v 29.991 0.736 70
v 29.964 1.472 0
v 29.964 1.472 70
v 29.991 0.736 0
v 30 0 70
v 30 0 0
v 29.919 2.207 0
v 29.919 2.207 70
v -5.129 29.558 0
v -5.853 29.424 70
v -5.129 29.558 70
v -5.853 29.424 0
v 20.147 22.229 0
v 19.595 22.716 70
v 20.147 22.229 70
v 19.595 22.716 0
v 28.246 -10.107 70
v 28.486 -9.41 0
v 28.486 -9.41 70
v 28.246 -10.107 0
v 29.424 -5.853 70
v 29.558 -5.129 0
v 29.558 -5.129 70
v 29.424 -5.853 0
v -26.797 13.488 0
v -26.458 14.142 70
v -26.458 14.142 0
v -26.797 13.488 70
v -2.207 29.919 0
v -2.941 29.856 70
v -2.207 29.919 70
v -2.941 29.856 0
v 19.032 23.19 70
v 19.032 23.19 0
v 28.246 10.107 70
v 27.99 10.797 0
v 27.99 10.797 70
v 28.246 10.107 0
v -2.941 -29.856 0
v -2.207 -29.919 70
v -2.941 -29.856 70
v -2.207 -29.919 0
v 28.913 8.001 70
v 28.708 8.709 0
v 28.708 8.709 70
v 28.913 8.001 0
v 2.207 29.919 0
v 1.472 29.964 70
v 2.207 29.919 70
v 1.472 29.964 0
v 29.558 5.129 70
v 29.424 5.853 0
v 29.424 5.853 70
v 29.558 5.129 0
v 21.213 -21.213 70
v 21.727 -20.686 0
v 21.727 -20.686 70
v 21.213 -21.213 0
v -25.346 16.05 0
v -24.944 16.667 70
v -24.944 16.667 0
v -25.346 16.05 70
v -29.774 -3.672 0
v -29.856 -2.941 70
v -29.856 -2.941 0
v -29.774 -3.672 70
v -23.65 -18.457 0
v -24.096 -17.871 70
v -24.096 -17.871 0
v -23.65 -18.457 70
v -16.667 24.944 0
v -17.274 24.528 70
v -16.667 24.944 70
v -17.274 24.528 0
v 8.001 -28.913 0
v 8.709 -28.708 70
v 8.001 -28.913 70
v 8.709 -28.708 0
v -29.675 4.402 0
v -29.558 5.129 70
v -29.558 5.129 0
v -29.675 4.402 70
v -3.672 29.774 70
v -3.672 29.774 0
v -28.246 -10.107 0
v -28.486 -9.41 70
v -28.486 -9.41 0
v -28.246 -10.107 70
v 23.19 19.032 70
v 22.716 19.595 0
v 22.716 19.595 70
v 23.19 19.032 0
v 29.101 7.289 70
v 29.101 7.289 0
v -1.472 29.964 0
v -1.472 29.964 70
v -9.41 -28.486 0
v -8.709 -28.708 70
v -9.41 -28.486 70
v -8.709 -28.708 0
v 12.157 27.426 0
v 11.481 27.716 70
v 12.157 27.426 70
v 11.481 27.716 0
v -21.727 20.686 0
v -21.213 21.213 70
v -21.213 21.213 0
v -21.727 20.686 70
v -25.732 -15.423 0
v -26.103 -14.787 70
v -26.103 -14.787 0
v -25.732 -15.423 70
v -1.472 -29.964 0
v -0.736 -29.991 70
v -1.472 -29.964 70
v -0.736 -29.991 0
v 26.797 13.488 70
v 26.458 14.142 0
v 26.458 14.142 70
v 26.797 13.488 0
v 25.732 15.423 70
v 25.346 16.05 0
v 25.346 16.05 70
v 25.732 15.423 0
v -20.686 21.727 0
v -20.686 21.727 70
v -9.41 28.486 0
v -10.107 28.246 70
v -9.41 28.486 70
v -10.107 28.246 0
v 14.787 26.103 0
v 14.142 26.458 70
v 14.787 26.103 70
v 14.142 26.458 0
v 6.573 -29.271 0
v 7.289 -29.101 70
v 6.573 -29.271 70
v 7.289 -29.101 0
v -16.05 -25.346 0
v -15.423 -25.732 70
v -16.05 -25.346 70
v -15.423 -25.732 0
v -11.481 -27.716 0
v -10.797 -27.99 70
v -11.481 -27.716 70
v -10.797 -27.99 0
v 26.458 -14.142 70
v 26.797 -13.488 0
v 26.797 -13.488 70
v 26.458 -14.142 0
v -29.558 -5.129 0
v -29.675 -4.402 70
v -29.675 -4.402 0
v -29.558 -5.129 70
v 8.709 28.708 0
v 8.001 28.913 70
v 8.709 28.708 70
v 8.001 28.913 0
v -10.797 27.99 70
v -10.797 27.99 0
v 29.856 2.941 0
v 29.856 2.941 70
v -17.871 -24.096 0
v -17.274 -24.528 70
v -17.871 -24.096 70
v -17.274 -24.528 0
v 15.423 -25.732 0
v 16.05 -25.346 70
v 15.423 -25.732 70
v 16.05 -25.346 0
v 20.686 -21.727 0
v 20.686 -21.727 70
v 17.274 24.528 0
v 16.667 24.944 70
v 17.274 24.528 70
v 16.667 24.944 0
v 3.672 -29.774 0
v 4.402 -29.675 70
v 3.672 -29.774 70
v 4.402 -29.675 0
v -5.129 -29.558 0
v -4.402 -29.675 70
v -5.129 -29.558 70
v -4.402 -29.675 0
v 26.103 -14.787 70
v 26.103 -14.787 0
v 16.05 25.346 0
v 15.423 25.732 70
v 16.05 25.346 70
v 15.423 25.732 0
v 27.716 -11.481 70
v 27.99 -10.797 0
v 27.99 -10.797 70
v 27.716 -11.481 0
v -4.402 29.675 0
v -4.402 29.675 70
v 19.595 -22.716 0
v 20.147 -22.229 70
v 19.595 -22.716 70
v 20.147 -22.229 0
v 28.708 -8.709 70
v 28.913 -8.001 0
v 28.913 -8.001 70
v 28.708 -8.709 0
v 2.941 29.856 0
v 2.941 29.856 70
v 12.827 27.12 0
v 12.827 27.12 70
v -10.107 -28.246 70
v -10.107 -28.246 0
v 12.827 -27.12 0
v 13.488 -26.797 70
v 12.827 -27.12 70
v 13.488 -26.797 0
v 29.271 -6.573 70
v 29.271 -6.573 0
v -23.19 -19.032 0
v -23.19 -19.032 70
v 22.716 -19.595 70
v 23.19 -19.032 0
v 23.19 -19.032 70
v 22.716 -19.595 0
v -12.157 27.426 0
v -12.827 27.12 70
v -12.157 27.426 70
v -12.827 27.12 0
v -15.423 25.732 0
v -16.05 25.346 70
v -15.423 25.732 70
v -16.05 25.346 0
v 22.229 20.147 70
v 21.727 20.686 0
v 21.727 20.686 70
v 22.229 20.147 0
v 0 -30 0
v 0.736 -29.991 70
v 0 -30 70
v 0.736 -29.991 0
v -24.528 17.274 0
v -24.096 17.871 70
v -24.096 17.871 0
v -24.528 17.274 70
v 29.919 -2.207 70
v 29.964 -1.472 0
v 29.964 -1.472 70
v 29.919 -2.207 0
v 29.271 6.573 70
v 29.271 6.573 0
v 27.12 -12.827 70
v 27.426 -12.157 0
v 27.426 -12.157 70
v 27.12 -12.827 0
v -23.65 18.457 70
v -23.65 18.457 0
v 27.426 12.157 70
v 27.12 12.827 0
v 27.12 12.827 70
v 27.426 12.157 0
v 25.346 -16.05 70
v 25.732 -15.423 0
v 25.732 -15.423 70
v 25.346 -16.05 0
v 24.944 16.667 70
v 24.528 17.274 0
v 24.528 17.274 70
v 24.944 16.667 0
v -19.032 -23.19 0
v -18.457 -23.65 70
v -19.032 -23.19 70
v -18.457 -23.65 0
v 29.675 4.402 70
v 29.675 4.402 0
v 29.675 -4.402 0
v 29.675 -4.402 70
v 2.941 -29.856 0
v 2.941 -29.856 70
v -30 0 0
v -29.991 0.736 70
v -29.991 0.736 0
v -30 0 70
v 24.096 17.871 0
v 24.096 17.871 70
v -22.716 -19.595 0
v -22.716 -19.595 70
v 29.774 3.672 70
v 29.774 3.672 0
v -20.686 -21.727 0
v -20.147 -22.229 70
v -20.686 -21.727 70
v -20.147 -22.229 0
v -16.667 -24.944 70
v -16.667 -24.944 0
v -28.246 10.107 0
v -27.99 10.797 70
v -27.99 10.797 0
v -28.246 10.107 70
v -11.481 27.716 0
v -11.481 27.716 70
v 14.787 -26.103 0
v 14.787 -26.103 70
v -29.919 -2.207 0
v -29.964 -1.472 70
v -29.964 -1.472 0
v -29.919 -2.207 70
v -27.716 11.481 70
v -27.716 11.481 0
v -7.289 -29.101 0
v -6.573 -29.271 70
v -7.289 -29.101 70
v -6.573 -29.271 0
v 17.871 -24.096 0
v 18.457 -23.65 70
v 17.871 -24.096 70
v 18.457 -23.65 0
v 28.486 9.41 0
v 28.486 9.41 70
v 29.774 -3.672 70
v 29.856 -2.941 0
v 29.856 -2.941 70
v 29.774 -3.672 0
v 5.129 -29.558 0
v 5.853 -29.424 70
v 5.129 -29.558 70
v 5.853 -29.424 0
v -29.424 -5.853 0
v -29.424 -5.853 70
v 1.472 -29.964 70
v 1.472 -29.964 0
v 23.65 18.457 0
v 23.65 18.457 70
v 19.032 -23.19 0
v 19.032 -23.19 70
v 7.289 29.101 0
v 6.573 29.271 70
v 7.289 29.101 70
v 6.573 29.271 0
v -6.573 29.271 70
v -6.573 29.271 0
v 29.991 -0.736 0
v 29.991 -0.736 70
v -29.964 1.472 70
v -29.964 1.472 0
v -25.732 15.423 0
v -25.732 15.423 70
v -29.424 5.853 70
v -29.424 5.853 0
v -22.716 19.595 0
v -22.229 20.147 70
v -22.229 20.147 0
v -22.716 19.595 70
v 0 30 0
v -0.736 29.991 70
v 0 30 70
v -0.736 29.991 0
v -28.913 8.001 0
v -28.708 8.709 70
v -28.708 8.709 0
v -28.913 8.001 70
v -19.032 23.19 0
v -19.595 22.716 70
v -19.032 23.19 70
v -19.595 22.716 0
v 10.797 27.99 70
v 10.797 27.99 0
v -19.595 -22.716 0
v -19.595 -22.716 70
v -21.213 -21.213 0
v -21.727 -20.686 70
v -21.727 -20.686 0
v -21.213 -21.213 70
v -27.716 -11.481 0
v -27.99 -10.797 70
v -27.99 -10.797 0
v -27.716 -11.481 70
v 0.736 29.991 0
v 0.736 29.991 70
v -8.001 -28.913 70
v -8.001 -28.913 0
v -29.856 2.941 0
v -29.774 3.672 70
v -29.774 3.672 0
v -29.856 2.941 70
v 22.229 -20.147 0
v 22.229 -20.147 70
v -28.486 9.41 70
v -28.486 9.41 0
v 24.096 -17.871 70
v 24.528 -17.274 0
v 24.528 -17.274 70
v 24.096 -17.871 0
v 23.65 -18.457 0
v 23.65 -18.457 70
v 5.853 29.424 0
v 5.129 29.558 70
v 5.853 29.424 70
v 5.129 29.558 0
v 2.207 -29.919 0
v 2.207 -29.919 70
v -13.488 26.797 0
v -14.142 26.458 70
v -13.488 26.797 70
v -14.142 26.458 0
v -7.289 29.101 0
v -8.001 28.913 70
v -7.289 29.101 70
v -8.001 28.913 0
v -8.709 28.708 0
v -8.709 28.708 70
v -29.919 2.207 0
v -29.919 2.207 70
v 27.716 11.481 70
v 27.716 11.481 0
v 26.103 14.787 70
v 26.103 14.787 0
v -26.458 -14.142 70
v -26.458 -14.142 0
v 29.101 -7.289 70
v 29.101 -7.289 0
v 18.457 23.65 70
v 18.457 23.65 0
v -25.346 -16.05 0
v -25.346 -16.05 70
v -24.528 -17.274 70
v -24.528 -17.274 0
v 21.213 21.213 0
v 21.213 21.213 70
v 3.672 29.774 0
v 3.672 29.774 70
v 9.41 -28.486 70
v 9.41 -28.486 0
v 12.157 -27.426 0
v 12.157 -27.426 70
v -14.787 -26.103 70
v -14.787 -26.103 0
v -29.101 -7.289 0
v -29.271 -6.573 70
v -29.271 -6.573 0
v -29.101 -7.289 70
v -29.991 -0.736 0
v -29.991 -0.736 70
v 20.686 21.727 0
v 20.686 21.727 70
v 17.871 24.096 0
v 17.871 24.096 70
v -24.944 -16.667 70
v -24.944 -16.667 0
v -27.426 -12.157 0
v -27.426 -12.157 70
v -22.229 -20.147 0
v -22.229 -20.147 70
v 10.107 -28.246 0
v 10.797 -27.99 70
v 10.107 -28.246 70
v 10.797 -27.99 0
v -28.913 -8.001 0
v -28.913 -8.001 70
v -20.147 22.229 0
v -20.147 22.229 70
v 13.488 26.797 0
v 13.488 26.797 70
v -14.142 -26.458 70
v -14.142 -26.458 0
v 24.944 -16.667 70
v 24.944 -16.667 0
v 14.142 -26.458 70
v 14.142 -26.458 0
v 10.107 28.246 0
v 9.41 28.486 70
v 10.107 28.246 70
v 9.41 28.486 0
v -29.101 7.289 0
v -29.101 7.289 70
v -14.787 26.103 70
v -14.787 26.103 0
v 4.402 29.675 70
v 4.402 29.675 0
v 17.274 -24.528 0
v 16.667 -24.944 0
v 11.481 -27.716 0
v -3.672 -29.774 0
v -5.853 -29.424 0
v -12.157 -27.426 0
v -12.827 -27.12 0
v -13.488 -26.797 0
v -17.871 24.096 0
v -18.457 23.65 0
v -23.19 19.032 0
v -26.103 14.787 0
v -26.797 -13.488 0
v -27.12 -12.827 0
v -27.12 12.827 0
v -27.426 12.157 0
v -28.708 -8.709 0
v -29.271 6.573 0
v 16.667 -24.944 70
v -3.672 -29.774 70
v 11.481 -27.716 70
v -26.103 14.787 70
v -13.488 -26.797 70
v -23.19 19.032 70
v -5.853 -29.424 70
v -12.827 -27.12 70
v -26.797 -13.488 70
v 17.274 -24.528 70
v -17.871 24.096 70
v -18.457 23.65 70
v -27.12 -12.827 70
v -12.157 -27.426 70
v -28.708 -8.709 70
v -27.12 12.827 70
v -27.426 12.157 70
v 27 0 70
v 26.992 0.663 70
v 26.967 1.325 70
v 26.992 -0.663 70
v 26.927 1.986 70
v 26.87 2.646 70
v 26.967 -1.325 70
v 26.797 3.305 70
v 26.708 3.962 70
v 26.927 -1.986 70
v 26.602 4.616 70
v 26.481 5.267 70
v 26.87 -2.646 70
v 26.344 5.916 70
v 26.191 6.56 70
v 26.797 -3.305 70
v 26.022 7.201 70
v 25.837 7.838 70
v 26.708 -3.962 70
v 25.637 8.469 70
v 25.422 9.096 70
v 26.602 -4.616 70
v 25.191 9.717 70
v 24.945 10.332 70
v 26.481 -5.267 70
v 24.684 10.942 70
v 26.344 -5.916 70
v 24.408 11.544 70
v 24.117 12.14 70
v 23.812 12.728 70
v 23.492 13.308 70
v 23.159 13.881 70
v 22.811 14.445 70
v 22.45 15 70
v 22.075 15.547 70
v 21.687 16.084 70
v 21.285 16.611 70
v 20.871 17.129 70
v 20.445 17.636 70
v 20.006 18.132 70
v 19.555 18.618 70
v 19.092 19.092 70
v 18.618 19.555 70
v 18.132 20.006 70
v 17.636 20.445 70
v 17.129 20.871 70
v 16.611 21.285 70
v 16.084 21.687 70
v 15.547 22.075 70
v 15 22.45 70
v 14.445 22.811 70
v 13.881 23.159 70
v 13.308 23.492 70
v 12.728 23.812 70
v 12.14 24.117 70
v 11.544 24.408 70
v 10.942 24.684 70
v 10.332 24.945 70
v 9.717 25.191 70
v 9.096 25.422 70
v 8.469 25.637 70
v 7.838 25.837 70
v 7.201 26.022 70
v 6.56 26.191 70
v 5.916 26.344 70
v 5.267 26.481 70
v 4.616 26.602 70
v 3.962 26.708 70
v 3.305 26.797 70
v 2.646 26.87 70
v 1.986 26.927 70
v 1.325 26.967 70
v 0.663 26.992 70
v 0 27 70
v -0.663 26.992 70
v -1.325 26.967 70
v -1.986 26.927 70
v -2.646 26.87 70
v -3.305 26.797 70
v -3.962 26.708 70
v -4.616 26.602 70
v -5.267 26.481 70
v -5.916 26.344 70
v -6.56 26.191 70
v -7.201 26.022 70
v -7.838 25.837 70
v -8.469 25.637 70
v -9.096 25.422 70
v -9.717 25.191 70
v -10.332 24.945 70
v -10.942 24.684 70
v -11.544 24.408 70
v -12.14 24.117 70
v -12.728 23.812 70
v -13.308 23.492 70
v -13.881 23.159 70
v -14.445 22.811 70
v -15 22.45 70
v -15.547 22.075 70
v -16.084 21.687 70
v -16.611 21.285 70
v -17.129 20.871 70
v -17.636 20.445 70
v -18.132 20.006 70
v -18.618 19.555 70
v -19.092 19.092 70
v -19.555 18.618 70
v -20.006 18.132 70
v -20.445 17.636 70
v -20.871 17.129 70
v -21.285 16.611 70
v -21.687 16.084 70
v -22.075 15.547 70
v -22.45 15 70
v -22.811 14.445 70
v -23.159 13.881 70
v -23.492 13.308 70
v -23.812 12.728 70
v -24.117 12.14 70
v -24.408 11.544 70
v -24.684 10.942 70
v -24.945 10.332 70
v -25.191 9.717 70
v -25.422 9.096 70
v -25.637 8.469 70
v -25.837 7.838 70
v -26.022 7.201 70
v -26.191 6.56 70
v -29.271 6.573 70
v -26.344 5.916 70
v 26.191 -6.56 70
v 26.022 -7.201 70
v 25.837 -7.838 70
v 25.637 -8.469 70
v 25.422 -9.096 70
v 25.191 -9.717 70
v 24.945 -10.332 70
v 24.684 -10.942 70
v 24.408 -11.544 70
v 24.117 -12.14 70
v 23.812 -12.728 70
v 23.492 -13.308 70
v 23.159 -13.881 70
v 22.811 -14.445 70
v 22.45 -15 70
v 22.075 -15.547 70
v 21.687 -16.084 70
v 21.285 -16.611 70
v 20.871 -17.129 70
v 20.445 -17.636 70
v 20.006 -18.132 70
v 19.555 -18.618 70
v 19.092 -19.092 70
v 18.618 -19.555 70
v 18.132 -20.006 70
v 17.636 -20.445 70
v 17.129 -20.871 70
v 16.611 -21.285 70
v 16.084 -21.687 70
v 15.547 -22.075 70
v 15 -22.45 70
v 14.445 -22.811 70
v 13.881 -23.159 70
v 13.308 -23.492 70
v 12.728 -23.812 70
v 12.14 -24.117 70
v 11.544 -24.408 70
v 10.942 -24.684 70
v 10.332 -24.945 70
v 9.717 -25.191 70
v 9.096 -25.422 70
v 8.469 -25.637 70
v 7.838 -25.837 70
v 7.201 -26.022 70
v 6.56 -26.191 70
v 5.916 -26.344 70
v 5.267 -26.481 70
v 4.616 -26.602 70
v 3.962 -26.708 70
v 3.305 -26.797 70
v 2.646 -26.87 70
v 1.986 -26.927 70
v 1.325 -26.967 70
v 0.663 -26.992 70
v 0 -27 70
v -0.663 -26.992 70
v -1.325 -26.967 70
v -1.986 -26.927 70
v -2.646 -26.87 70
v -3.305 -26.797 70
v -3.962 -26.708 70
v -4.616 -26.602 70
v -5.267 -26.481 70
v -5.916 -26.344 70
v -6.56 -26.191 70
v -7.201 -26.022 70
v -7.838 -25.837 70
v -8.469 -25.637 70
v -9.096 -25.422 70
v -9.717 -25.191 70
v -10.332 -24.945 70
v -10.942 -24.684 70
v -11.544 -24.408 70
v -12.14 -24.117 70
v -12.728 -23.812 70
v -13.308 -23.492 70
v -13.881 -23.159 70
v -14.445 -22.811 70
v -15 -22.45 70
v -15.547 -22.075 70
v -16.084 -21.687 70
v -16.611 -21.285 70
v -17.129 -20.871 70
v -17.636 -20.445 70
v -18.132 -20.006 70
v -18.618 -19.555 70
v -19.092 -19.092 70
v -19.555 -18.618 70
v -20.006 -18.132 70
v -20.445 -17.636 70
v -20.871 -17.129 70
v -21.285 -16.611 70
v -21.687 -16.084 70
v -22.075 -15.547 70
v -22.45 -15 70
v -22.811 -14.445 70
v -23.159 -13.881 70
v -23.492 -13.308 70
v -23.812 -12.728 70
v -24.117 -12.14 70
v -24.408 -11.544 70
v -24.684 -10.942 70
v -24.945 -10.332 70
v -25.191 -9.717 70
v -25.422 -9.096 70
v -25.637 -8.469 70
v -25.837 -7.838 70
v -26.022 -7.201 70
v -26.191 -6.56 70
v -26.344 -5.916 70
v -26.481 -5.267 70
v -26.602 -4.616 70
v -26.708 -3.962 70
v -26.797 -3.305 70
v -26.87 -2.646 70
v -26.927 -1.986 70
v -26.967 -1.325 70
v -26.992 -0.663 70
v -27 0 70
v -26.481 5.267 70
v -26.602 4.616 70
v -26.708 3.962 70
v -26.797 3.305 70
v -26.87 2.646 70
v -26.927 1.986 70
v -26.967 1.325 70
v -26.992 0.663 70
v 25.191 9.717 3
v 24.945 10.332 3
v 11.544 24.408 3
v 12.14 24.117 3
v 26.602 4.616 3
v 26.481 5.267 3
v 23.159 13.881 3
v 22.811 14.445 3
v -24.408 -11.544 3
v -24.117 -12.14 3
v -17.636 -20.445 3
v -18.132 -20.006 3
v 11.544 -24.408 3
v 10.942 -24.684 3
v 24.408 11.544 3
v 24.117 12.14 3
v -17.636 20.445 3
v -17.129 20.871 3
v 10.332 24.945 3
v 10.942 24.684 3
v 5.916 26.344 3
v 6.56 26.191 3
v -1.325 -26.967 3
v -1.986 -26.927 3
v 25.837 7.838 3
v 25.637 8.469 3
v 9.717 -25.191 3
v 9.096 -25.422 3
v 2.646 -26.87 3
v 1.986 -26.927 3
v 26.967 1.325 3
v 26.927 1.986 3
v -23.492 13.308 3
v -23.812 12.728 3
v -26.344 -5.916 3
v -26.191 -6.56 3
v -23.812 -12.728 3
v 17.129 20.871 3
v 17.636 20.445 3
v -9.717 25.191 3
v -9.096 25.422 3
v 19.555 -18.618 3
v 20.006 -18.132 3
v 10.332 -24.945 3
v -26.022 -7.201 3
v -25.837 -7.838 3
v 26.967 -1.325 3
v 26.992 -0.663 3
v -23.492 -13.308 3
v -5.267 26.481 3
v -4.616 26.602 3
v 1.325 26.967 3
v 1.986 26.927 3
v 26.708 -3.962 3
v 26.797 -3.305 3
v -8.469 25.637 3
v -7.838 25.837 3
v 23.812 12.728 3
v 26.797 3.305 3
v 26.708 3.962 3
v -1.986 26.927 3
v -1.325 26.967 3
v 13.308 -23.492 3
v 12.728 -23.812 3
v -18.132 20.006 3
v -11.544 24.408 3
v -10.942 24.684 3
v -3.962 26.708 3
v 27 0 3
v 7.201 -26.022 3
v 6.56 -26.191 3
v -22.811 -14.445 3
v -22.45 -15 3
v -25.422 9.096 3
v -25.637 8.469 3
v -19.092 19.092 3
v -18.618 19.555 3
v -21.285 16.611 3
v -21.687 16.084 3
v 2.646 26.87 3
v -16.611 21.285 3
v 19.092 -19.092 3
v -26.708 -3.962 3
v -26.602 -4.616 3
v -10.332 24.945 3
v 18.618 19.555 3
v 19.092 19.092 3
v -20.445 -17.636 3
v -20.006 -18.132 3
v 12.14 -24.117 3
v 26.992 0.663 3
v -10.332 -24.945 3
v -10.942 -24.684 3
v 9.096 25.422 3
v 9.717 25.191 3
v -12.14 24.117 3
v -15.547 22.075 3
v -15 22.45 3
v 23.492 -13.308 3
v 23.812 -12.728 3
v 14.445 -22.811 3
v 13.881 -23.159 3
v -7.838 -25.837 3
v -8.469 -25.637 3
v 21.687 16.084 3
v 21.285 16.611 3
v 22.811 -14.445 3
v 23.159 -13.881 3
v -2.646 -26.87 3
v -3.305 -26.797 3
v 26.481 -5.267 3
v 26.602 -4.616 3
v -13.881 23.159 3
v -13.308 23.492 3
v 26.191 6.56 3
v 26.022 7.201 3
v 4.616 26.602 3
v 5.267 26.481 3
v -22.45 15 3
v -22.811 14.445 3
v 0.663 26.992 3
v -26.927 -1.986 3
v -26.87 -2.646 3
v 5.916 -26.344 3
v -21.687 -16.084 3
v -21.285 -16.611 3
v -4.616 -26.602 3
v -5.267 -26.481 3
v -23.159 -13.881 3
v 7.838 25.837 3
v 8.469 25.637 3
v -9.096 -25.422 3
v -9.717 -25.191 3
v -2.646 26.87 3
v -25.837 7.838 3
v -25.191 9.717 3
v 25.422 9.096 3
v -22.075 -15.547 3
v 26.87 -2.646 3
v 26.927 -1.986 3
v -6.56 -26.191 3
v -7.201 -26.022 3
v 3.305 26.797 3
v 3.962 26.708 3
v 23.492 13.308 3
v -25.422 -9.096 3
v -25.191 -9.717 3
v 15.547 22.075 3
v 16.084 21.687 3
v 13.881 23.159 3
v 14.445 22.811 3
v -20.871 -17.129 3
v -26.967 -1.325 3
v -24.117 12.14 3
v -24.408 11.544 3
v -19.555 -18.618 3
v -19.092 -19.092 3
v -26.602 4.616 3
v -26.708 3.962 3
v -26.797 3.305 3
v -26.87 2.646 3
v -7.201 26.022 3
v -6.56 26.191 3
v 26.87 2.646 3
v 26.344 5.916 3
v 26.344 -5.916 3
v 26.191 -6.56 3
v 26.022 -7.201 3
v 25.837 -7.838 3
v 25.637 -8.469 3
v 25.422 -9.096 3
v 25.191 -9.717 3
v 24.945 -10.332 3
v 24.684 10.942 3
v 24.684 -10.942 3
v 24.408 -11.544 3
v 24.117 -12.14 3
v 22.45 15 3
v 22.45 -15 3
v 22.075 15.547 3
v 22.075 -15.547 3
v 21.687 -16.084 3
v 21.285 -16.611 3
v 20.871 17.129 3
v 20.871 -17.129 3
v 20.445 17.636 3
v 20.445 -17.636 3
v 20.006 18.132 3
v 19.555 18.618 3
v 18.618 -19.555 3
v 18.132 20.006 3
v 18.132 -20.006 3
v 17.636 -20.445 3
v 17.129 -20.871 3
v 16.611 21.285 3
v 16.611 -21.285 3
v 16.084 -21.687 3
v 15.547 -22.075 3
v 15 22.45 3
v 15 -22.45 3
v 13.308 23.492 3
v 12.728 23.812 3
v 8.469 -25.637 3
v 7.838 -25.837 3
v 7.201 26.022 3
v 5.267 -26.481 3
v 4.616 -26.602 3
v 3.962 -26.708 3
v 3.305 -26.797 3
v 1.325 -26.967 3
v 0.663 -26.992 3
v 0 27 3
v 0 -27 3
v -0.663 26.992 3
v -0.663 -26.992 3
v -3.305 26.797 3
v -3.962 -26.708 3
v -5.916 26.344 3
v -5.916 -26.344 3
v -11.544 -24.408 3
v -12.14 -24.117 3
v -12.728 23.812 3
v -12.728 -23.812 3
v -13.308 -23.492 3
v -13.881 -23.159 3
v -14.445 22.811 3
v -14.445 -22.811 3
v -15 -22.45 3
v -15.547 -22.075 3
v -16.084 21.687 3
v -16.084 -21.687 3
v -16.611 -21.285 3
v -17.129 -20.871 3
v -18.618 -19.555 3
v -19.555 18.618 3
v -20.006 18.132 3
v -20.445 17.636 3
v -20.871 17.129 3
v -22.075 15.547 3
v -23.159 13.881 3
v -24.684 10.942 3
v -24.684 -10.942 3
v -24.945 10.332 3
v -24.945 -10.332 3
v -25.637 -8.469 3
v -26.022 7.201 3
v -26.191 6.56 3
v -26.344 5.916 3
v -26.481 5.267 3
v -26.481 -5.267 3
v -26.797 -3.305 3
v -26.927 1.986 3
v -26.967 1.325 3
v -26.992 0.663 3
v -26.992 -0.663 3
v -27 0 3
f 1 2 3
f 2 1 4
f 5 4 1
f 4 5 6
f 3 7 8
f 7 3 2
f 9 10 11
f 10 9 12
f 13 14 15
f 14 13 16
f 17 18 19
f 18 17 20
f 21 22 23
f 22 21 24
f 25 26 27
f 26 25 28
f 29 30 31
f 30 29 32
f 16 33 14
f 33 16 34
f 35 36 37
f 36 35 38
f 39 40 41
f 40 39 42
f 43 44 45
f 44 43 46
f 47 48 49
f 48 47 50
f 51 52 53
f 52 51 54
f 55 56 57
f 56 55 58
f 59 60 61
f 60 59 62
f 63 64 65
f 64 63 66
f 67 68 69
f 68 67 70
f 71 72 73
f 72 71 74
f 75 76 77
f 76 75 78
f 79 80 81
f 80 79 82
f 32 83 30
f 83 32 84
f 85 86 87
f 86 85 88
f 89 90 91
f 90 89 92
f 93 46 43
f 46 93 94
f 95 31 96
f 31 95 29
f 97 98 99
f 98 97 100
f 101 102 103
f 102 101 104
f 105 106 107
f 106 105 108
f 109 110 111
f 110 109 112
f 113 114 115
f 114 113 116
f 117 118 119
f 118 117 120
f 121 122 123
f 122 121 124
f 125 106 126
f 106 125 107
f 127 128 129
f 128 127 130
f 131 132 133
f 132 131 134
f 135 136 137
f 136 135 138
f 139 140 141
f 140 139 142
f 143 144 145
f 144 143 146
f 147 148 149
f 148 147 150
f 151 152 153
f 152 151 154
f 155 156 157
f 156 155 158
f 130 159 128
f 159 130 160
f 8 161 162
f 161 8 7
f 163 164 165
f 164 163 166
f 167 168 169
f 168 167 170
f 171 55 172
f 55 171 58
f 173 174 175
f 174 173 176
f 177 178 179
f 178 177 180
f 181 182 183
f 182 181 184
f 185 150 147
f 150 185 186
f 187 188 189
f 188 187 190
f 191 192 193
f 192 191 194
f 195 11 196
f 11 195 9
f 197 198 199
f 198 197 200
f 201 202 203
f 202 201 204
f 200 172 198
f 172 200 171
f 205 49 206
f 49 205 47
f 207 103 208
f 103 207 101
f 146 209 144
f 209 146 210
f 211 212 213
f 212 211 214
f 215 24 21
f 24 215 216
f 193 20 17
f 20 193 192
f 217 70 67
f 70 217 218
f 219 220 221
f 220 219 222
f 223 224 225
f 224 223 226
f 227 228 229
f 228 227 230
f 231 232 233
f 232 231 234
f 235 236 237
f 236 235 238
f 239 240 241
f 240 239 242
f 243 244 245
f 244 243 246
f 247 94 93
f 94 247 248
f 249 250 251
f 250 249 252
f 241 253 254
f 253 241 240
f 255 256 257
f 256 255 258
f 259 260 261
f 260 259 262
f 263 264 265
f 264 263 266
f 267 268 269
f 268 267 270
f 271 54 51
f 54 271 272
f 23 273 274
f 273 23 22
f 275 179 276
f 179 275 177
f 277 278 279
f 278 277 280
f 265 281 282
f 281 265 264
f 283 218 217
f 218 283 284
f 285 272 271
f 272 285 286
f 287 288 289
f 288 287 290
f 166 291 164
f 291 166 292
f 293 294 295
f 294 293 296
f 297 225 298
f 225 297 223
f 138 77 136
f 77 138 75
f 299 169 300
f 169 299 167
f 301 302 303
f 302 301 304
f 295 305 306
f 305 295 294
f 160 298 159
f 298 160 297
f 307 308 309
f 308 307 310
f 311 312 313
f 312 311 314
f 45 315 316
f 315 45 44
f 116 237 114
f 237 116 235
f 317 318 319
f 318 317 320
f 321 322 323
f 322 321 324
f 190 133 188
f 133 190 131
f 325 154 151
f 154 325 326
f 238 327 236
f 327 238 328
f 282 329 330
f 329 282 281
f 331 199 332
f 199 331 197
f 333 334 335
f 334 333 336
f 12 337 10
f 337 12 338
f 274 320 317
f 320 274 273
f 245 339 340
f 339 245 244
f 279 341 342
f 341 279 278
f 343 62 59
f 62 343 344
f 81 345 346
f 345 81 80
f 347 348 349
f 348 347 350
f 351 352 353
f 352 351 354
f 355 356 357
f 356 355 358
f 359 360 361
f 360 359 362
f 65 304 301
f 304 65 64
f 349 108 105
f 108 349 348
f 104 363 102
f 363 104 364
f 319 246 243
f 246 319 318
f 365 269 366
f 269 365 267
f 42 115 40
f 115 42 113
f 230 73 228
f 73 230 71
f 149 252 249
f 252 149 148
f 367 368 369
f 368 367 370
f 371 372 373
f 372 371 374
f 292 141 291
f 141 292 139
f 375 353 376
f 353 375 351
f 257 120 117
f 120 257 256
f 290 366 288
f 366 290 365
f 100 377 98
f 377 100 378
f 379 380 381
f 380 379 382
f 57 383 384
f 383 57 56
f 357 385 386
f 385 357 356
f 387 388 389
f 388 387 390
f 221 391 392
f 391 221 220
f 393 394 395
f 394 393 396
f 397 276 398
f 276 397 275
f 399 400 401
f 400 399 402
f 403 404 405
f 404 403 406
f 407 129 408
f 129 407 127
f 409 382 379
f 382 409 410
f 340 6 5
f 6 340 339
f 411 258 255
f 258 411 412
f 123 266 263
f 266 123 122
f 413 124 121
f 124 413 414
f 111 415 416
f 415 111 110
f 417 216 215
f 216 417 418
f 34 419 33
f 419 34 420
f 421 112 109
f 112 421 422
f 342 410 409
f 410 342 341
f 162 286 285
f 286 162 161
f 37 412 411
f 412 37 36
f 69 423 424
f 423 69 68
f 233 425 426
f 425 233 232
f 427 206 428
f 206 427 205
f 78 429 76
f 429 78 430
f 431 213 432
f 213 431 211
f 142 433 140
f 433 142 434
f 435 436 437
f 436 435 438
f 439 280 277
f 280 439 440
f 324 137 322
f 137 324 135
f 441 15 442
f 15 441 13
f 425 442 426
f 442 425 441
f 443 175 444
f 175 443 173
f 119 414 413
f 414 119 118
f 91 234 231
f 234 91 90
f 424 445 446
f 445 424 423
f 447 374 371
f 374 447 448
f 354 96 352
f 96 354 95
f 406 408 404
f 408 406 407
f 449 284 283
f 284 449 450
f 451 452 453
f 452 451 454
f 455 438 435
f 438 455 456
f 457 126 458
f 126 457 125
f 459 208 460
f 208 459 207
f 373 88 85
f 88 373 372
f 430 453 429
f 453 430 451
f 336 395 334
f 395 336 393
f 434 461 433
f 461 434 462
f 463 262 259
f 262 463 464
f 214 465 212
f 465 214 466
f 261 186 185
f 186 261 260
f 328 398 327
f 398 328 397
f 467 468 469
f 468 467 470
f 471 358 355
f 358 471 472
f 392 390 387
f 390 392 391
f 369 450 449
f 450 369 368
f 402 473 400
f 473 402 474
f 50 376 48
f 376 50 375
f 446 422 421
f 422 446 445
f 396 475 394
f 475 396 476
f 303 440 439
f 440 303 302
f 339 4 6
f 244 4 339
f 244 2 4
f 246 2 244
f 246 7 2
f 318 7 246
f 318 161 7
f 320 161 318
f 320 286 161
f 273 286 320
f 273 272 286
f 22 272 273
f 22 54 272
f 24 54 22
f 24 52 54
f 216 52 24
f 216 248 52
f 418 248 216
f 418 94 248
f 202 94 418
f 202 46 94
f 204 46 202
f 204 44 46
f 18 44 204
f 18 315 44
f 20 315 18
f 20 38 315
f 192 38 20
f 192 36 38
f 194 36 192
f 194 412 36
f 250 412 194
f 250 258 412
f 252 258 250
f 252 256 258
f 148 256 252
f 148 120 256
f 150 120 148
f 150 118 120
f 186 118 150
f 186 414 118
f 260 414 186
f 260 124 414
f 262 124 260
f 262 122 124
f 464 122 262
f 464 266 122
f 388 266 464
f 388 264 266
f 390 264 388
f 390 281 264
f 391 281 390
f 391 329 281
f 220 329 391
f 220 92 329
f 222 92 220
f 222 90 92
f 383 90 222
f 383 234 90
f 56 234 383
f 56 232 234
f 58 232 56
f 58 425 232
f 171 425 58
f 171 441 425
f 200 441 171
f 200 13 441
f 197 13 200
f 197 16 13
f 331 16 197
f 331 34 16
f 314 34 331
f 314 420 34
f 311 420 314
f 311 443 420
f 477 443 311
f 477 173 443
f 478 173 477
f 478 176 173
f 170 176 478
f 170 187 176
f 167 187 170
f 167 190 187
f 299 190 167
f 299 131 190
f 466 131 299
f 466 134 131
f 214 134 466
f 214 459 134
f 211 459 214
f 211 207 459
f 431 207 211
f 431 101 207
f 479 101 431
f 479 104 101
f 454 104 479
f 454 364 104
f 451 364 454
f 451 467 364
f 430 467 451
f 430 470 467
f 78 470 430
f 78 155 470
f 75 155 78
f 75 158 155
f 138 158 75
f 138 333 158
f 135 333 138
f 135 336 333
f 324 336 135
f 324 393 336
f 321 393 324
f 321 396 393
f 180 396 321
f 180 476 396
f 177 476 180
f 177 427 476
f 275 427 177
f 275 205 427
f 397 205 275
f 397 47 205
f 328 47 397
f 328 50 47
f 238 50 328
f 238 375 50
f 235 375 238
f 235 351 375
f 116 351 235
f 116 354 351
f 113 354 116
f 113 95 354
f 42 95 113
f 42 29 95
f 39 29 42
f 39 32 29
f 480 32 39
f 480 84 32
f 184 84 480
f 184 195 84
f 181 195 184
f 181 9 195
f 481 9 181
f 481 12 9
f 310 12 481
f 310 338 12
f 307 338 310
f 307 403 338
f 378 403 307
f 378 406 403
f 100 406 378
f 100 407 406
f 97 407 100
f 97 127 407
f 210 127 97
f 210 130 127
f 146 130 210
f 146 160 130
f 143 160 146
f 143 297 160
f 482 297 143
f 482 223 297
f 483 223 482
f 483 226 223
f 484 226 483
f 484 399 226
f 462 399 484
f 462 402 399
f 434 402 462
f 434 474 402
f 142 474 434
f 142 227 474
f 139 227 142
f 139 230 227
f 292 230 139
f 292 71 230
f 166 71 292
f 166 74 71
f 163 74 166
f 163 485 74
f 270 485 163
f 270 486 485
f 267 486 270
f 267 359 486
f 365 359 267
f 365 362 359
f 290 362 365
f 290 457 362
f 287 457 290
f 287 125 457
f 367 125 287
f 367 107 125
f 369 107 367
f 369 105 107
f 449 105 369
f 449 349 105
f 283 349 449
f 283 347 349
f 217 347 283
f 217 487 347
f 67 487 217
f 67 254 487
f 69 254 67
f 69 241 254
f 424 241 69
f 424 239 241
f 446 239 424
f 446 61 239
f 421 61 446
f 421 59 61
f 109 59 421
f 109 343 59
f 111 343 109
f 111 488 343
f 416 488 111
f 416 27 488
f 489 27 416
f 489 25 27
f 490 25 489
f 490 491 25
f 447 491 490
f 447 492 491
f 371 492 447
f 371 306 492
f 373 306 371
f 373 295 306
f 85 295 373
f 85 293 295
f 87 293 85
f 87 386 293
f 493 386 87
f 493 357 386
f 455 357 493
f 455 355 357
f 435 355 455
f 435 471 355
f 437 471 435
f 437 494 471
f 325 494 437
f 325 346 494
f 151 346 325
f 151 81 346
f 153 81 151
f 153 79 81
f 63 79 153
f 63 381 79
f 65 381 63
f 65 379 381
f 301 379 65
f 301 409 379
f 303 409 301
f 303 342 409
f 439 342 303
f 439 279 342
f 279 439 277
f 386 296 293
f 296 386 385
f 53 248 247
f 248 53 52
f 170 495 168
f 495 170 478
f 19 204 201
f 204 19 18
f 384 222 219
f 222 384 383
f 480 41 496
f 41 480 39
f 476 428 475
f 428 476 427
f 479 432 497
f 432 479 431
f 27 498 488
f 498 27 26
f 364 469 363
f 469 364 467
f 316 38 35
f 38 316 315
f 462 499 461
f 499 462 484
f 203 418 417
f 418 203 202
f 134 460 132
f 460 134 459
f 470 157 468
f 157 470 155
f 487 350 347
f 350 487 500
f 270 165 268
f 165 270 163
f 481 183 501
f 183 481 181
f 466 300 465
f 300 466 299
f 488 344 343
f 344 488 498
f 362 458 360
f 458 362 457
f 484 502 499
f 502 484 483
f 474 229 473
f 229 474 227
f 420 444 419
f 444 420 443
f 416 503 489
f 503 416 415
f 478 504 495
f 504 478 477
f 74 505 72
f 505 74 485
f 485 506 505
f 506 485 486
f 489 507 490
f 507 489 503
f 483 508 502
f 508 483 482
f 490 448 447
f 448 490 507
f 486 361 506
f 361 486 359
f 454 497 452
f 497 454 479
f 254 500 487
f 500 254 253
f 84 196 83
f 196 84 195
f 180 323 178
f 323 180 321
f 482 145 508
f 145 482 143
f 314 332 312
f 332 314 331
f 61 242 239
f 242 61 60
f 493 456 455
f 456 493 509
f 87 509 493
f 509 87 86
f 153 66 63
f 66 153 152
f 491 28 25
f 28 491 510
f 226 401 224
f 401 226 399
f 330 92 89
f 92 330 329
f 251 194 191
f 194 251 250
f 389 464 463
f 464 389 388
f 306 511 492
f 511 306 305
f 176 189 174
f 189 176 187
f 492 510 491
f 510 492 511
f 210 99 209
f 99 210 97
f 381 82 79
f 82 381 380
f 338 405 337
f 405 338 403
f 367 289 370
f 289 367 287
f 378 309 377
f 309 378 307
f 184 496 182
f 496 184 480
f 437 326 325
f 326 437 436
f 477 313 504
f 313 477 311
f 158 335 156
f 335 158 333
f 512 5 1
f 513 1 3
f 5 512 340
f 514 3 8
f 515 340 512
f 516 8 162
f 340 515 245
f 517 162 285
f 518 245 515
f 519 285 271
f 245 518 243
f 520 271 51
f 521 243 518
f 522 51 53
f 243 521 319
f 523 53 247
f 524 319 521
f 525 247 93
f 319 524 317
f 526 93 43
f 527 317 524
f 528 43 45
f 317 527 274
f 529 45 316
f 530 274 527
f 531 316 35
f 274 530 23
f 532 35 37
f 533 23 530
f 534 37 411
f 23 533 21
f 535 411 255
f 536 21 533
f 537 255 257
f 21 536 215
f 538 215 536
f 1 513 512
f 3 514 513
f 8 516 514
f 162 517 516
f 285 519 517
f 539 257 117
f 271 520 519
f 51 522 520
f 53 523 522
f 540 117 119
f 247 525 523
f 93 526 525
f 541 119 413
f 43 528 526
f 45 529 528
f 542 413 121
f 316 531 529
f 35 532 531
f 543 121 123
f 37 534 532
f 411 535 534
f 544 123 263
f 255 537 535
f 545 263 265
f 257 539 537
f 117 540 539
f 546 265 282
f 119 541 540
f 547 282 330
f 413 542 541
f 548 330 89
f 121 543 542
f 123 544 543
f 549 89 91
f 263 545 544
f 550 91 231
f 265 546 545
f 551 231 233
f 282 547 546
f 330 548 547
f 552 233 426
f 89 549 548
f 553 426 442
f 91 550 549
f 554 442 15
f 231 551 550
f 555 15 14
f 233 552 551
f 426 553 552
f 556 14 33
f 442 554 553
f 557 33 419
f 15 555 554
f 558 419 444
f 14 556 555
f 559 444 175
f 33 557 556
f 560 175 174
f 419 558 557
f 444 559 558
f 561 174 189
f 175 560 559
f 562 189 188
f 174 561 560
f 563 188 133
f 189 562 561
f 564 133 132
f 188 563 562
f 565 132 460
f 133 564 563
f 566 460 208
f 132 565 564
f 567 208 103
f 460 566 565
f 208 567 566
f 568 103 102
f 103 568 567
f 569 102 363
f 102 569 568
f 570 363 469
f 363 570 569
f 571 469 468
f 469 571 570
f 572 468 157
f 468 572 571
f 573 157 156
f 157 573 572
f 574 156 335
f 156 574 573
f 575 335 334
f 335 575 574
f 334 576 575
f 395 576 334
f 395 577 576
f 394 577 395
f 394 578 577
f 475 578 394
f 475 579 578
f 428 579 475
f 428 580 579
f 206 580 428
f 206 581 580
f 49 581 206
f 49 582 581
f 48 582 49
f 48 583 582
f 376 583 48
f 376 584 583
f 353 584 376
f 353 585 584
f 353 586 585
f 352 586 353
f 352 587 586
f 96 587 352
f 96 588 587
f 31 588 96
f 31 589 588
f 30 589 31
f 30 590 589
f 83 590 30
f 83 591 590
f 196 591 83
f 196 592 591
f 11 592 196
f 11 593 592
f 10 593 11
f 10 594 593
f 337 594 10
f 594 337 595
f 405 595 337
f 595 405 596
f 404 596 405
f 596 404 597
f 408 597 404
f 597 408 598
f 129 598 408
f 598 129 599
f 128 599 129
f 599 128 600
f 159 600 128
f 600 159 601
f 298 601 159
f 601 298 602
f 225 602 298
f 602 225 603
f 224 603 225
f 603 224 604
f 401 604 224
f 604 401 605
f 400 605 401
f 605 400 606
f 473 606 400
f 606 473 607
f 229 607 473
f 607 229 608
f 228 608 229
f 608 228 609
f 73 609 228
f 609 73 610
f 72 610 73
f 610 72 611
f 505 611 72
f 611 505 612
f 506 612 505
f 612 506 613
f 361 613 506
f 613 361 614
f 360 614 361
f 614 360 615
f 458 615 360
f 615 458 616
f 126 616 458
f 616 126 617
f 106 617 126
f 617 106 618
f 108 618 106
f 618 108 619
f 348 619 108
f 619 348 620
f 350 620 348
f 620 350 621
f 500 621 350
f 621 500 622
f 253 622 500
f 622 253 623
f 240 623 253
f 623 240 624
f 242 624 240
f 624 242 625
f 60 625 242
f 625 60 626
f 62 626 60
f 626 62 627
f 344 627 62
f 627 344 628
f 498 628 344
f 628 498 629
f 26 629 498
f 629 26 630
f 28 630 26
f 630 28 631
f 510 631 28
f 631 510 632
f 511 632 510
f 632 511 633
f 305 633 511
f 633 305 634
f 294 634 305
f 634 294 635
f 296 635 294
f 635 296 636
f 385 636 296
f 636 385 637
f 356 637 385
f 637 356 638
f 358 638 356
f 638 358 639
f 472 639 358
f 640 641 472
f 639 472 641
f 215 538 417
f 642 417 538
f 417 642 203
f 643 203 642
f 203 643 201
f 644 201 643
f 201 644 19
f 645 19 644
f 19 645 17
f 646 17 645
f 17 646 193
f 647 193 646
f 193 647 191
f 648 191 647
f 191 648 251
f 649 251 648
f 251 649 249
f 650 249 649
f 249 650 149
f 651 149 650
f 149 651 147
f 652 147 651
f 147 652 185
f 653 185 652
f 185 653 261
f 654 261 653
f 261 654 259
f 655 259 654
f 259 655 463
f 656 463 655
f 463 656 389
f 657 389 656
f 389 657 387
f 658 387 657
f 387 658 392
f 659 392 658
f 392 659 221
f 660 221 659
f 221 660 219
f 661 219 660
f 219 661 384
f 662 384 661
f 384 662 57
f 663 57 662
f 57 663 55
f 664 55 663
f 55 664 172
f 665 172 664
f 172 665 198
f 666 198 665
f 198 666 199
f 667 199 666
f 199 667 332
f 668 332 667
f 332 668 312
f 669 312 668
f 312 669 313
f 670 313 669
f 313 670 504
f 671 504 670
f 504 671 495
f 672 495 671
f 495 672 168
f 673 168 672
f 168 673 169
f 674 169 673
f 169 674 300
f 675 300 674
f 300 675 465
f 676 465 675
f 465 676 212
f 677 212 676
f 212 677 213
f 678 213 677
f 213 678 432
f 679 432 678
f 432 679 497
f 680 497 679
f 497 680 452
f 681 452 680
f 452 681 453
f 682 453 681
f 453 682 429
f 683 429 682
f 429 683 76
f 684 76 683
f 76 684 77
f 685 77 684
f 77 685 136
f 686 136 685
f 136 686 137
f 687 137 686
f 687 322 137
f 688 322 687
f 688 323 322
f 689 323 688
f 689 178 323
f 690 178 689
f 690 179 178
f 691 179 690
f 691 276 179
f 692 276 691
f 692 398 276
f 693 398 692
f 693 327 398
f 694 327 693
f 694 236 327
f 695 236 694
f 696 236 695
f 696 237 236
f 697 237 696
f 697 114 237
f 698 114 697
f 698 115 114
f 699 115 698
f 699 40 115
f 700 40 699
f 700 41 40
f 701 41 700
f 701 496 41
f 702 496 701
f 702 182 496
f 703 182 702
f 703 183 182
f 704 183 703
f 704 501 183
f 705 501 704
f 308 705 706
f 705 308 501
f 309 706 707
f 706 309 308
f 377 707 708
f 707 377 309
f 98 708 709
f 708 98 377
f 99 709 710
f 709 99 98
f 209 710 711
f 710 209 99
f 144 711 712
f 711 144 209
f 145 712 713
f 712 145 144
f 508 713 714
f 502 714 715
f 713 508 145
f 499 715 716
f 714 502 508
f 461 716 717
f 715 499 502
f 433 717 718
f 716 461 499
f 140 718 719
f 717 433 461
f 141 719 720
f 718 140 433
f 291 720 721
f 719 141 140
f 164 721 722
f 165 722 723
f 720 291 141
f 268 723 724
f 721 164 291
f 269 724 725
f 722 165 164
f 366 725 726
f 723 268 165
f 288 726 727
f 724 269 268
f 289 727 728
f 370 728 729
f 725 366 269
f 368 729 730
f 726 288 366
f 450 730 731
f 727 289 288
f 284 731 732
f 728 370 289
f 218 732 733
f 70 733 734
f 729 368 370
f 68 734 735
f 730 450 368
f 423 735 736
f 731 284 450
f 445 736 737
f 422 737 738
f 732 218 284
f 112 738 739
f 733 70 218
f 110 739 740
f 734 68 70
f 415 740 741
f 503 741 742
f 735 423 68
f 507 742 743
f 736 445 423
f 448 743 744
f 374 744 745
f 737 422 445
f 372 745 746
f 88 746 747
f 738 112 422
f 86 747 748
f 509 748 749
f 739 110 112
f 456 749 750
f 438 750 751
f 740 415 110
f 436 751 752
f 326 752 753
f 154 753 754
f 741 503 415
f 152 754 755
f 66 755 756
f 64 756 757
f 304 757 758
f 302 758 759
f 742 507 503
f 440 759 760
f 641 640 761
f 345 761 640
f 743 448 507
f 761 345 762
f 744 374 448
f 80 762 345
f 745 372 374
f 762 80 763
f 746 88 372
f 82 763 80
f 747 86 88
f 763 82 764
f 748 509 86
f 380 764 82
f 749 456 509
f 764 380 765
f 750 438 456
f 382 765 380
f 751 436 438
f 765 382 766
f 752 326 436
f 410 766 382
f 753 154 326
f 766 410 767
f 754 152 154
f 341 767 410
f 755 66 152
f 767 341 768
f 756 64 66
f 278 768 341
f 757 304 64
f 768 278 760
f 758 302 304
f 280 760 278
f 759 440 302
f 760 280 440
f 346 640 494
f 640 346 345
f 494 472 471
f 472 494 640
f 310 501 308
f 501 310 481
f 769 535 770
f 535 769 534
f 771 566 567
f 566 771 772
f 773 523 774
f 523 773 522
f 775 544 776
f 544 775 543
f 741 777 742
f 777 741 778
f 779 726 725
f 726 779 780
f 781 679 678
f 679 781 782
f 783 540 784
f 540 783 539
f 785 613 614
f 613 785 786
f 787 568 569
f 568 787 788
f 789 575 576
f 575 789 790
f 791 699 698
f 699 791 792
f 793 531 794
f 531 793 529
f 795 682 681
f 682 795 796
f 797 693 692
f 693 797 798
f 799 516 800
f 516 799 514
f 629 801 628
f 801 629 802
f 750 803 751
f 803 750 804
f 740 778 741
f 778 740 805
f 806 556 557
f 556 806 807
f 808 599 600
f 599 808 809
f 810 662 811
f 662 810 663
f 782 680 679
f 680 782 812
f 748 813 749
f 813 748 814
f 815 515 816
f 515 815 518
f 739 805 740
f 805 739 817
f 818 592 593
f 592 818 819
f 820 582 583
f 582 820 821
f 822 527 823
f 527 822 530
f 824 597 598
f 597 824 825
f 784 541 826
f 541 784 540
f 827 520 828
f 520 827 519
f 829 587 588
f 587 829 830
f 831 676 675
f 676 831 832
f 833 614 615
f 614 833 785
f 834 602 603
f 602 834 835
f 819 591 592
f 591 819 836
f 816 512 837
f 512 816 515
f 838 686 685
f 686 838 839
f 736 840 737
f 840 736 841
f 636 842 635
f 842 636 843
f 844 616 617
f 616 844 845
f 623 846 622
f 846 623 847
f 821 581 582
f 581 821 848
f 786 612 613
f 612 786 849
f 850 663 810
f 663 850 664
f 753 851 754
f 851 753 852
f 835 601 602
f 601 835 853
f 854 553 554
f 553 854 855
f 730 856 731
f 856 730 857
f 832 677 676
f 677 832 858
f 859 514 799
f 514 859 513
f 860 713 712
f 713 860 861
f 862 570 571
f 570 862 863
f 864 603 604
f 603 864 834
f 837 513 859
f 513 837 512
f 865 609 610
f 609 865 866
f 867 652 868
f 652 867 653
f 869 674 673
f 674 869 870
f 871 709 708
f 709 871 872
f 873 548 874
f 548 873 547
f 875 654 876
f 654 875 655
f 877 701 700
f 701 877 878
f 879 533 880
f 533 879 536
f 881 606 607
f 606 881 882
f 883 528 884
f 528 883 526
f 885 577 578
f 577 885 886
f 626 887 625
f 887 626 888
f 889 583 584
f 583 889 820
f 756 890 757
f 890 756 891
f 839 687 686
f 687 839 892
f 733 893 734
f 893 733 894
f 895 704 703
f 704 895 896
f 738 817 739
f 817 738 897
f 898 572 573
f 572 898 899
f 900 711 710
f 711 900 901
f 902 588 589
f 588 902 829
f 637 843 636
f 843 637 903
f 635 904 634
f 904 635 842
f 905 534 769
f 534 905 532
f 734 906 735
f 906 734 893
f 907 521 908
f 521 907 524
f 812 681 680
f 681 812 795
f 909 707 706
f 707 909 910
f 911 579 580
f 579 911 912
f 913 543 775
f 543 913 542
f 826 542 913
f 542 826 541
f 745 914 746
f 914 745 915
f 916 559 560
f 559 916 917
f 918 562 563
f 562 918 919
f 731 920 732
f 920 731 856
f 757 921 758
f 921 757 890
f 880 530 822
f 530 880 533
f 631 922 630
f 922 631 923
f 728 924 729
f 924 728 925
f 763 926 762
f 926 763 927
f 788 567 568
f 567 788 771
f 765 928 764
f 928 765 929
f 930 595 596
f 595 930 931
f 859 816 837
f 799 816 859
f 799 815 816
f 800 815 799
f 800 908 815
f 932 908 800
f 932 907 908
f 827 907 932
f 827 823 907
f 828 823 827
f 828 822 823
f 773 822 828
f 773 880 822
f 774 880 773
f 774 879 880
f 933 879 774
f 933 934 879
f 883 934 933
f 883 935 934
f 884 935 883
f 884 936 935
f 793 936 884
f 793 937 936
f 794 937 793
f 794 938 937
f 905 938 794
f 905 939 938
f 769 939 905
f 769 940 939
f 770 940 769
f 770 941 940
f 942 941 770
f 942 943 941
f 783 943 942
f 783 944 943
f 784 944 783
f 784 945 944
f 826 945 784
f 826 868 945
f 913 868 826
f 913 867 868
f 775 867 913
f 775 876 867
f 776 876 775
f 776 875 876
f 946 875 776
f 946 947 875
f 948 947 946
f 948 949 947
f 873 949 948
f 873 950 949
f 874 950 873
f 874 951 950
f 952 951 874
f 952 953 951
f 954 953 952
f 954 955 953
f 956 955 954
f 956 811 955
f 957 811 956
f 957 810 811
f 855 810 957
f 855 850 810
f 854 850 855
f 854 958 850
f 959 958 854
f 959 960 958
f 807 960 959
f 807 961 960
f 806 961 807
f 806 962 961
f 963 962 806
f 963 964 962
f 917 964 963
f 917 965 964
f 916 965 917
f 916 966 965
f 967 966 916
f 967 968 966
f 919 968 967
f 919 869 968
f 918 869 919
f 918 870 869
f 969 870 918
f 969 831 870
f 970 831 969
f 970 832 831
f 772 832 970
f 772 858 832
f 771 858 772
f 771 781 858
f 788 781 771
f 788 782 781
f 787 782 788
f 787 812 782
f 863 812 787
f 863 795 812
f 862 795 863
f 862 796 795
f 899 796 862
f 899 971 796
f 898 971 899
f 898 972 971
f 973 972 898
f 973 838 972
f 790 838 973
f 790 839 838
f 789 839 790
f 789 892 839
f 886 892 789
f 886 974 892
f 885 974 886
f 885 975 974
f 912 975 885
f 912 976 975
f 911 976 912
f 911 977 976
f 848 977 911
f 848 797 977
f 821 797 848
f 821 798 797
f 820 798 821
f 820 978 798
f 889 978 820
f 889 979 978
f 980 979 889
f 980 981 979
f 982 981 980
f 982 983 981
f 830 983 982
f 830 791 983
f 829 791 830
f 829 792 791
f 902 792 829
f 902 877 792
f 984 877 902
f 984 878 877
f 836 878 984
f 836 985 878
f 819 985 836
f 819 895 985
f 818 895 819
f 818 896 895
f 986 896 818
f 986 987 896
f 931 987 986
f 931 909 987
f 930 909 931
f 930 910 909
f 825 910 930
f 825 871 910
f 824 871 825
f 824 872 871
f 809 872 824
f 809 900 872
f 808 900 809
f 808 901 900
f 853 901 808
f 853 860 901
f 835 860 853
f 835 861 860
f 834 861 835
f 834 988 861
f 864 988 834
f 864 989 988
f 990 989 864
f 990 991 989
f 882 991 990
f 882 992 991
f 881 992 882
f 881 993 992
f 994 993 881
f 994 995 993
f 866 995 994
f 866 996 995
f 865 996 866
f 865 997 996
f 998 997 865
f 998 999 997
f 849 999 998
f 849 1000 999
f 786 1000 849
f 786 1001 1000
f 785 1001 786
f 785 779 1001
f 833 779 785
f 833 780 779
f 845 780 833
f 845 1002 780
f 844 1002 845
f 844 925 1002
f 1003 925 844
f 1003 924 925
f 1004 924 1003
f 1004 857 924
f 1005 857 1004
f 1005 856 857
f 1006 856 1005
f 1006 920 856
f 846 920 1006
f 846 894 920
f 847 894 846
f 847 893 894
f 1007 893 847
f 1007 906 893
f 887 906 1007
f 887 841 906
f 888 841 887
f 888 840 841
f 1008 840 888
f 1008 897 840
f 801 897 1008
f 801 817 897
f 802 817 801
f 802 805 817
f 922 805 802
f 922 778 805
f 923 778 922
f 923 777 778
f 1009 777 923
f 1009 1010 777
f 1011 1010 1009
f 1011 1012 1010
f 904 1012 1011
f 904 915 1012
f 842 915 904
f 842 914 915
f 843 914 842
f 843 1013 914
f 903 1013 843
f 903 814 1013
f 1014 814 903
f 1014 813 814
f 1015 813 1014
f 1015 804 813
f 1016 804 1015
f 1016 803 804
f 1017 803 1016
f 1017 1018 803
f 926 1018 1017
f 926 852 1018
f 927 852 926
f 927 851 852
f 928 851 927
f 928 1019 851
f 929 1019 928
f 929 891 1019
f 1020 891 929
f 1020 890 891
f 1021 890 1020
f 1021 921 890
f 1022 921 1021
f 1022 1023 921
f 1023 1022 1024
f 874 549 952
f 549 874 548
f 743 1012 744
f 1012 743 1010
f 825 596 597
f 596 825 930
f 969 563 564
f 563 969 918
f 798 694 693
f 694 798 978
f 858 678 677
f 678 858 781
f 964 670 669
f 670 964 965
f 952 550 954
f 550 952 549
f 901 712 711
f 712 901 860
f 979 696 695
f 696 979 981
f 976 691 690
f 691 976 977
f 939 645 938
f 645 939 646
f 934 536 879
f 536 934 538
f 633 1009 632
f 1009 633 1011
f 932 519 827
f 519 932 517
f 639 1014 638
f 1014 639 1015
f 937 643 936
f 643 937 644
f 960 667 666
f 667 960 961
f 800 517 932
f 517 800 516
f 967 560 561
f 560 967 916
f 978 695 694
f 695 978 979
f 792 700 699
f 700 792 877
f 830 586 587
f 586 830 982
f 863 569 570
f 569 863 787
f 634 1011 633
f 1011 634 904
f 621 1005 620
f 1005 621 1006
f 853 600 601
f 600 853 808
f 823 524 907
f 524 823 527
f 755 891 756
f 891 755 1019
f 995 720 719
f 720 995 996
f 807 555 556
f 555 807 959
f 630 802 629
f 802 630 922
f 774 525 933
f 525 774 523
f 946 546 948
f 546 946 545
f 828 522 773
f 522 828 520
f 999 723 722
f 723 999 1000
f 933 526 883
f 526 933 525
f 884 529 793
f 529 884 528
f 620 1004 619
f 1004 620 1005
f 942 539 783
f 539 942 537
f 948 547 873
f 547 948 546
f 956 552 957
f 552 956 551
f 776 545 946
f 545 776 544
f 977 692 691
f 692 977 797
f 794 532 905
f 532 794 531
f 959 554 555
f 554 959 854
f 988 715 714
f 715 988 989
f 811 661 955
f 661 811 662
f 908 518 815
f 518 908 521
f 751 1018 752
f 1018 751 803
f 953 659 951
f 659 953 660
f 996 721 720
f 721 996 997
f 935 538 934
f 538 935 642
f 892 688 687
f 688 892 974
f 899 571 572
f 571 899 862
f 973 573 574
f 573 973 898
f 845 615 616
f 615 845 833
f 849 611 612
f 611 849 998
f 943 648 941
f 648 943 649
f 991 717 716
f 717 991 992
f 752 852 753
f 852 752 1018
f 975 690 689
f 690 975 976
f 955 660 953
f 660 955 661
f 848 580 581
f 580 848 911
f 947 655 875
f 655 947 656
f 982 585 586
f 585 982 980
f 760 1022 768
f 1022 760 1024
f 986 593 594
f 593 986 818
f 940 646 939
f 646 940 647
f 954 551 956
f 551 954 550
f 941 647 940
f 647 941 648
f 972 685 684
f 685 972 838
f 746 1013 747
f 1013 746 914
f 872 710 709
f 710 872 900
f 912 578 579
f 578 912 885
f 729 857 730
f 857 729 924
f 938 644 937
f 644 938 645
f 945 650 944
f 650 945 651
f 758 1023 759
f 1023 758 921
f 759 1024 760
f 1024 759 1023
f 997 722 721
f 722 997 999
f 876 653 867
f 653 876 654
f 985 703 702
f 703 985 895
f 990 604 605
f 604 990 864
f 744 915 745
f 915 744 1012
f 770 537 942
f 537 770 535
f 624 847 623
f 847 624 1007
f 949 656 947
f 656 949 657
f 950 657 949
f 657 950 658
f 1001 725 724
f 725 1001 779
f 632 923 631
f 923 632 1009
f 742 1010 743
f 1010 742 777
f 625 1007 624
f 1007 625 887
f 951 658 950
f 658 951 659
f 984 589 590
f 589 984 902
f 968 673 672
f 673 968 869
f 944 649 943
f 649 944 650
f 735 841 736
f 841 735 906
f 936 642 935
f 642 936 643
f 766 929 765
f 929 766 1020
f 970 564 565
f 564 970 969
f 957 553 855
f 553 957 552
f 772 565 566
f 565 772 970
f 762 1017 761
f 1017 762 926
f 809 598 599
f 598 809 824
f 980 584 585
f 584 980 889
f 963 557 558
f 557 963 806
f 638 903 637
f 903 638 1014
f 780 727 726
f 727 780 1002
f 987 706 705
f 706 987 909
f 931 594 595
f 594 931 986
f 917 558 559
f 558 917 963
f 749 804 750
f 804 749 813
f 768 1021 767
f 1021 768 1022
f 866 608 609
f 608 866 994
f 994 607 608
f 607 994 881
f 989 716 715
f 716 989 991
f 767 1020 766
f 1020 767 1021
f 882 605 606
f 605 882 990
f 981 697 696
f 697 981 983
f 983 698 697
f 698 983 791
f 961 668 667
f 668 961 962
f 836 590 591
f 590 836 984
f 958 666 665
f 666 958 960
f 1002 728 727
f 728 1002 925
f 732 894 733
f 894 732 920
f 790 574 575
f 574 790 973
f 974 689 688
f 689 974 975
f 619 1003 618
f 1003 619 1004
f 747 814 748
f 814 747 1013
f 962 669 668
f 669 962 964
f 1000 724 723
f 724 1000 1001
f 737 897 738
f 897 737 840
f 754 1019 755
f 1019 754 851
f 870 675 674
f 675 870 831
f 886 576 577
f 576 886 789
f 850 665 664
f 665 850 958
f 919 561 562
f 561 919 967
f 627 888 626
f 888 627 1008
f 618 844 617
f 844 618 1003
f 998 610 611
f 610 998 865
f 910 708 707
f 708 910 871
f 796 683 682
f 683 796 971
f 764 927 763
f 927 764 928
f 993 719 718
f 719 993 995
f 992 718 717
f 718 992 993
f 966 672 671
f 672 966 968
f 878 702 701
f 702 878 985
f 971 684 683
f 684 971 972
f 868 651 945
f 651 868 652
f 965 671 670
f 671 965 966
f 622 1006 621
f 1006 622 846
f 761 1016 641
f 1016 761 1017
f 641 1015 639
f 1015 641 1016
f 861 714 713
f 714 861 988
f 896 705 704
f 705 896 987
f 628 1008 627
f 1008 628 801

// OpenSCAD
$fn=256;
BoxH=70;
BoxD=60;
Wall=3;
DW=Wall*2;

difference()
{
  cylinder(h=BoxH,d=BoxD);
  translate([0,0,Wall]) cylinder(h=BoxH+DW,d=BoxD-DW);
}
